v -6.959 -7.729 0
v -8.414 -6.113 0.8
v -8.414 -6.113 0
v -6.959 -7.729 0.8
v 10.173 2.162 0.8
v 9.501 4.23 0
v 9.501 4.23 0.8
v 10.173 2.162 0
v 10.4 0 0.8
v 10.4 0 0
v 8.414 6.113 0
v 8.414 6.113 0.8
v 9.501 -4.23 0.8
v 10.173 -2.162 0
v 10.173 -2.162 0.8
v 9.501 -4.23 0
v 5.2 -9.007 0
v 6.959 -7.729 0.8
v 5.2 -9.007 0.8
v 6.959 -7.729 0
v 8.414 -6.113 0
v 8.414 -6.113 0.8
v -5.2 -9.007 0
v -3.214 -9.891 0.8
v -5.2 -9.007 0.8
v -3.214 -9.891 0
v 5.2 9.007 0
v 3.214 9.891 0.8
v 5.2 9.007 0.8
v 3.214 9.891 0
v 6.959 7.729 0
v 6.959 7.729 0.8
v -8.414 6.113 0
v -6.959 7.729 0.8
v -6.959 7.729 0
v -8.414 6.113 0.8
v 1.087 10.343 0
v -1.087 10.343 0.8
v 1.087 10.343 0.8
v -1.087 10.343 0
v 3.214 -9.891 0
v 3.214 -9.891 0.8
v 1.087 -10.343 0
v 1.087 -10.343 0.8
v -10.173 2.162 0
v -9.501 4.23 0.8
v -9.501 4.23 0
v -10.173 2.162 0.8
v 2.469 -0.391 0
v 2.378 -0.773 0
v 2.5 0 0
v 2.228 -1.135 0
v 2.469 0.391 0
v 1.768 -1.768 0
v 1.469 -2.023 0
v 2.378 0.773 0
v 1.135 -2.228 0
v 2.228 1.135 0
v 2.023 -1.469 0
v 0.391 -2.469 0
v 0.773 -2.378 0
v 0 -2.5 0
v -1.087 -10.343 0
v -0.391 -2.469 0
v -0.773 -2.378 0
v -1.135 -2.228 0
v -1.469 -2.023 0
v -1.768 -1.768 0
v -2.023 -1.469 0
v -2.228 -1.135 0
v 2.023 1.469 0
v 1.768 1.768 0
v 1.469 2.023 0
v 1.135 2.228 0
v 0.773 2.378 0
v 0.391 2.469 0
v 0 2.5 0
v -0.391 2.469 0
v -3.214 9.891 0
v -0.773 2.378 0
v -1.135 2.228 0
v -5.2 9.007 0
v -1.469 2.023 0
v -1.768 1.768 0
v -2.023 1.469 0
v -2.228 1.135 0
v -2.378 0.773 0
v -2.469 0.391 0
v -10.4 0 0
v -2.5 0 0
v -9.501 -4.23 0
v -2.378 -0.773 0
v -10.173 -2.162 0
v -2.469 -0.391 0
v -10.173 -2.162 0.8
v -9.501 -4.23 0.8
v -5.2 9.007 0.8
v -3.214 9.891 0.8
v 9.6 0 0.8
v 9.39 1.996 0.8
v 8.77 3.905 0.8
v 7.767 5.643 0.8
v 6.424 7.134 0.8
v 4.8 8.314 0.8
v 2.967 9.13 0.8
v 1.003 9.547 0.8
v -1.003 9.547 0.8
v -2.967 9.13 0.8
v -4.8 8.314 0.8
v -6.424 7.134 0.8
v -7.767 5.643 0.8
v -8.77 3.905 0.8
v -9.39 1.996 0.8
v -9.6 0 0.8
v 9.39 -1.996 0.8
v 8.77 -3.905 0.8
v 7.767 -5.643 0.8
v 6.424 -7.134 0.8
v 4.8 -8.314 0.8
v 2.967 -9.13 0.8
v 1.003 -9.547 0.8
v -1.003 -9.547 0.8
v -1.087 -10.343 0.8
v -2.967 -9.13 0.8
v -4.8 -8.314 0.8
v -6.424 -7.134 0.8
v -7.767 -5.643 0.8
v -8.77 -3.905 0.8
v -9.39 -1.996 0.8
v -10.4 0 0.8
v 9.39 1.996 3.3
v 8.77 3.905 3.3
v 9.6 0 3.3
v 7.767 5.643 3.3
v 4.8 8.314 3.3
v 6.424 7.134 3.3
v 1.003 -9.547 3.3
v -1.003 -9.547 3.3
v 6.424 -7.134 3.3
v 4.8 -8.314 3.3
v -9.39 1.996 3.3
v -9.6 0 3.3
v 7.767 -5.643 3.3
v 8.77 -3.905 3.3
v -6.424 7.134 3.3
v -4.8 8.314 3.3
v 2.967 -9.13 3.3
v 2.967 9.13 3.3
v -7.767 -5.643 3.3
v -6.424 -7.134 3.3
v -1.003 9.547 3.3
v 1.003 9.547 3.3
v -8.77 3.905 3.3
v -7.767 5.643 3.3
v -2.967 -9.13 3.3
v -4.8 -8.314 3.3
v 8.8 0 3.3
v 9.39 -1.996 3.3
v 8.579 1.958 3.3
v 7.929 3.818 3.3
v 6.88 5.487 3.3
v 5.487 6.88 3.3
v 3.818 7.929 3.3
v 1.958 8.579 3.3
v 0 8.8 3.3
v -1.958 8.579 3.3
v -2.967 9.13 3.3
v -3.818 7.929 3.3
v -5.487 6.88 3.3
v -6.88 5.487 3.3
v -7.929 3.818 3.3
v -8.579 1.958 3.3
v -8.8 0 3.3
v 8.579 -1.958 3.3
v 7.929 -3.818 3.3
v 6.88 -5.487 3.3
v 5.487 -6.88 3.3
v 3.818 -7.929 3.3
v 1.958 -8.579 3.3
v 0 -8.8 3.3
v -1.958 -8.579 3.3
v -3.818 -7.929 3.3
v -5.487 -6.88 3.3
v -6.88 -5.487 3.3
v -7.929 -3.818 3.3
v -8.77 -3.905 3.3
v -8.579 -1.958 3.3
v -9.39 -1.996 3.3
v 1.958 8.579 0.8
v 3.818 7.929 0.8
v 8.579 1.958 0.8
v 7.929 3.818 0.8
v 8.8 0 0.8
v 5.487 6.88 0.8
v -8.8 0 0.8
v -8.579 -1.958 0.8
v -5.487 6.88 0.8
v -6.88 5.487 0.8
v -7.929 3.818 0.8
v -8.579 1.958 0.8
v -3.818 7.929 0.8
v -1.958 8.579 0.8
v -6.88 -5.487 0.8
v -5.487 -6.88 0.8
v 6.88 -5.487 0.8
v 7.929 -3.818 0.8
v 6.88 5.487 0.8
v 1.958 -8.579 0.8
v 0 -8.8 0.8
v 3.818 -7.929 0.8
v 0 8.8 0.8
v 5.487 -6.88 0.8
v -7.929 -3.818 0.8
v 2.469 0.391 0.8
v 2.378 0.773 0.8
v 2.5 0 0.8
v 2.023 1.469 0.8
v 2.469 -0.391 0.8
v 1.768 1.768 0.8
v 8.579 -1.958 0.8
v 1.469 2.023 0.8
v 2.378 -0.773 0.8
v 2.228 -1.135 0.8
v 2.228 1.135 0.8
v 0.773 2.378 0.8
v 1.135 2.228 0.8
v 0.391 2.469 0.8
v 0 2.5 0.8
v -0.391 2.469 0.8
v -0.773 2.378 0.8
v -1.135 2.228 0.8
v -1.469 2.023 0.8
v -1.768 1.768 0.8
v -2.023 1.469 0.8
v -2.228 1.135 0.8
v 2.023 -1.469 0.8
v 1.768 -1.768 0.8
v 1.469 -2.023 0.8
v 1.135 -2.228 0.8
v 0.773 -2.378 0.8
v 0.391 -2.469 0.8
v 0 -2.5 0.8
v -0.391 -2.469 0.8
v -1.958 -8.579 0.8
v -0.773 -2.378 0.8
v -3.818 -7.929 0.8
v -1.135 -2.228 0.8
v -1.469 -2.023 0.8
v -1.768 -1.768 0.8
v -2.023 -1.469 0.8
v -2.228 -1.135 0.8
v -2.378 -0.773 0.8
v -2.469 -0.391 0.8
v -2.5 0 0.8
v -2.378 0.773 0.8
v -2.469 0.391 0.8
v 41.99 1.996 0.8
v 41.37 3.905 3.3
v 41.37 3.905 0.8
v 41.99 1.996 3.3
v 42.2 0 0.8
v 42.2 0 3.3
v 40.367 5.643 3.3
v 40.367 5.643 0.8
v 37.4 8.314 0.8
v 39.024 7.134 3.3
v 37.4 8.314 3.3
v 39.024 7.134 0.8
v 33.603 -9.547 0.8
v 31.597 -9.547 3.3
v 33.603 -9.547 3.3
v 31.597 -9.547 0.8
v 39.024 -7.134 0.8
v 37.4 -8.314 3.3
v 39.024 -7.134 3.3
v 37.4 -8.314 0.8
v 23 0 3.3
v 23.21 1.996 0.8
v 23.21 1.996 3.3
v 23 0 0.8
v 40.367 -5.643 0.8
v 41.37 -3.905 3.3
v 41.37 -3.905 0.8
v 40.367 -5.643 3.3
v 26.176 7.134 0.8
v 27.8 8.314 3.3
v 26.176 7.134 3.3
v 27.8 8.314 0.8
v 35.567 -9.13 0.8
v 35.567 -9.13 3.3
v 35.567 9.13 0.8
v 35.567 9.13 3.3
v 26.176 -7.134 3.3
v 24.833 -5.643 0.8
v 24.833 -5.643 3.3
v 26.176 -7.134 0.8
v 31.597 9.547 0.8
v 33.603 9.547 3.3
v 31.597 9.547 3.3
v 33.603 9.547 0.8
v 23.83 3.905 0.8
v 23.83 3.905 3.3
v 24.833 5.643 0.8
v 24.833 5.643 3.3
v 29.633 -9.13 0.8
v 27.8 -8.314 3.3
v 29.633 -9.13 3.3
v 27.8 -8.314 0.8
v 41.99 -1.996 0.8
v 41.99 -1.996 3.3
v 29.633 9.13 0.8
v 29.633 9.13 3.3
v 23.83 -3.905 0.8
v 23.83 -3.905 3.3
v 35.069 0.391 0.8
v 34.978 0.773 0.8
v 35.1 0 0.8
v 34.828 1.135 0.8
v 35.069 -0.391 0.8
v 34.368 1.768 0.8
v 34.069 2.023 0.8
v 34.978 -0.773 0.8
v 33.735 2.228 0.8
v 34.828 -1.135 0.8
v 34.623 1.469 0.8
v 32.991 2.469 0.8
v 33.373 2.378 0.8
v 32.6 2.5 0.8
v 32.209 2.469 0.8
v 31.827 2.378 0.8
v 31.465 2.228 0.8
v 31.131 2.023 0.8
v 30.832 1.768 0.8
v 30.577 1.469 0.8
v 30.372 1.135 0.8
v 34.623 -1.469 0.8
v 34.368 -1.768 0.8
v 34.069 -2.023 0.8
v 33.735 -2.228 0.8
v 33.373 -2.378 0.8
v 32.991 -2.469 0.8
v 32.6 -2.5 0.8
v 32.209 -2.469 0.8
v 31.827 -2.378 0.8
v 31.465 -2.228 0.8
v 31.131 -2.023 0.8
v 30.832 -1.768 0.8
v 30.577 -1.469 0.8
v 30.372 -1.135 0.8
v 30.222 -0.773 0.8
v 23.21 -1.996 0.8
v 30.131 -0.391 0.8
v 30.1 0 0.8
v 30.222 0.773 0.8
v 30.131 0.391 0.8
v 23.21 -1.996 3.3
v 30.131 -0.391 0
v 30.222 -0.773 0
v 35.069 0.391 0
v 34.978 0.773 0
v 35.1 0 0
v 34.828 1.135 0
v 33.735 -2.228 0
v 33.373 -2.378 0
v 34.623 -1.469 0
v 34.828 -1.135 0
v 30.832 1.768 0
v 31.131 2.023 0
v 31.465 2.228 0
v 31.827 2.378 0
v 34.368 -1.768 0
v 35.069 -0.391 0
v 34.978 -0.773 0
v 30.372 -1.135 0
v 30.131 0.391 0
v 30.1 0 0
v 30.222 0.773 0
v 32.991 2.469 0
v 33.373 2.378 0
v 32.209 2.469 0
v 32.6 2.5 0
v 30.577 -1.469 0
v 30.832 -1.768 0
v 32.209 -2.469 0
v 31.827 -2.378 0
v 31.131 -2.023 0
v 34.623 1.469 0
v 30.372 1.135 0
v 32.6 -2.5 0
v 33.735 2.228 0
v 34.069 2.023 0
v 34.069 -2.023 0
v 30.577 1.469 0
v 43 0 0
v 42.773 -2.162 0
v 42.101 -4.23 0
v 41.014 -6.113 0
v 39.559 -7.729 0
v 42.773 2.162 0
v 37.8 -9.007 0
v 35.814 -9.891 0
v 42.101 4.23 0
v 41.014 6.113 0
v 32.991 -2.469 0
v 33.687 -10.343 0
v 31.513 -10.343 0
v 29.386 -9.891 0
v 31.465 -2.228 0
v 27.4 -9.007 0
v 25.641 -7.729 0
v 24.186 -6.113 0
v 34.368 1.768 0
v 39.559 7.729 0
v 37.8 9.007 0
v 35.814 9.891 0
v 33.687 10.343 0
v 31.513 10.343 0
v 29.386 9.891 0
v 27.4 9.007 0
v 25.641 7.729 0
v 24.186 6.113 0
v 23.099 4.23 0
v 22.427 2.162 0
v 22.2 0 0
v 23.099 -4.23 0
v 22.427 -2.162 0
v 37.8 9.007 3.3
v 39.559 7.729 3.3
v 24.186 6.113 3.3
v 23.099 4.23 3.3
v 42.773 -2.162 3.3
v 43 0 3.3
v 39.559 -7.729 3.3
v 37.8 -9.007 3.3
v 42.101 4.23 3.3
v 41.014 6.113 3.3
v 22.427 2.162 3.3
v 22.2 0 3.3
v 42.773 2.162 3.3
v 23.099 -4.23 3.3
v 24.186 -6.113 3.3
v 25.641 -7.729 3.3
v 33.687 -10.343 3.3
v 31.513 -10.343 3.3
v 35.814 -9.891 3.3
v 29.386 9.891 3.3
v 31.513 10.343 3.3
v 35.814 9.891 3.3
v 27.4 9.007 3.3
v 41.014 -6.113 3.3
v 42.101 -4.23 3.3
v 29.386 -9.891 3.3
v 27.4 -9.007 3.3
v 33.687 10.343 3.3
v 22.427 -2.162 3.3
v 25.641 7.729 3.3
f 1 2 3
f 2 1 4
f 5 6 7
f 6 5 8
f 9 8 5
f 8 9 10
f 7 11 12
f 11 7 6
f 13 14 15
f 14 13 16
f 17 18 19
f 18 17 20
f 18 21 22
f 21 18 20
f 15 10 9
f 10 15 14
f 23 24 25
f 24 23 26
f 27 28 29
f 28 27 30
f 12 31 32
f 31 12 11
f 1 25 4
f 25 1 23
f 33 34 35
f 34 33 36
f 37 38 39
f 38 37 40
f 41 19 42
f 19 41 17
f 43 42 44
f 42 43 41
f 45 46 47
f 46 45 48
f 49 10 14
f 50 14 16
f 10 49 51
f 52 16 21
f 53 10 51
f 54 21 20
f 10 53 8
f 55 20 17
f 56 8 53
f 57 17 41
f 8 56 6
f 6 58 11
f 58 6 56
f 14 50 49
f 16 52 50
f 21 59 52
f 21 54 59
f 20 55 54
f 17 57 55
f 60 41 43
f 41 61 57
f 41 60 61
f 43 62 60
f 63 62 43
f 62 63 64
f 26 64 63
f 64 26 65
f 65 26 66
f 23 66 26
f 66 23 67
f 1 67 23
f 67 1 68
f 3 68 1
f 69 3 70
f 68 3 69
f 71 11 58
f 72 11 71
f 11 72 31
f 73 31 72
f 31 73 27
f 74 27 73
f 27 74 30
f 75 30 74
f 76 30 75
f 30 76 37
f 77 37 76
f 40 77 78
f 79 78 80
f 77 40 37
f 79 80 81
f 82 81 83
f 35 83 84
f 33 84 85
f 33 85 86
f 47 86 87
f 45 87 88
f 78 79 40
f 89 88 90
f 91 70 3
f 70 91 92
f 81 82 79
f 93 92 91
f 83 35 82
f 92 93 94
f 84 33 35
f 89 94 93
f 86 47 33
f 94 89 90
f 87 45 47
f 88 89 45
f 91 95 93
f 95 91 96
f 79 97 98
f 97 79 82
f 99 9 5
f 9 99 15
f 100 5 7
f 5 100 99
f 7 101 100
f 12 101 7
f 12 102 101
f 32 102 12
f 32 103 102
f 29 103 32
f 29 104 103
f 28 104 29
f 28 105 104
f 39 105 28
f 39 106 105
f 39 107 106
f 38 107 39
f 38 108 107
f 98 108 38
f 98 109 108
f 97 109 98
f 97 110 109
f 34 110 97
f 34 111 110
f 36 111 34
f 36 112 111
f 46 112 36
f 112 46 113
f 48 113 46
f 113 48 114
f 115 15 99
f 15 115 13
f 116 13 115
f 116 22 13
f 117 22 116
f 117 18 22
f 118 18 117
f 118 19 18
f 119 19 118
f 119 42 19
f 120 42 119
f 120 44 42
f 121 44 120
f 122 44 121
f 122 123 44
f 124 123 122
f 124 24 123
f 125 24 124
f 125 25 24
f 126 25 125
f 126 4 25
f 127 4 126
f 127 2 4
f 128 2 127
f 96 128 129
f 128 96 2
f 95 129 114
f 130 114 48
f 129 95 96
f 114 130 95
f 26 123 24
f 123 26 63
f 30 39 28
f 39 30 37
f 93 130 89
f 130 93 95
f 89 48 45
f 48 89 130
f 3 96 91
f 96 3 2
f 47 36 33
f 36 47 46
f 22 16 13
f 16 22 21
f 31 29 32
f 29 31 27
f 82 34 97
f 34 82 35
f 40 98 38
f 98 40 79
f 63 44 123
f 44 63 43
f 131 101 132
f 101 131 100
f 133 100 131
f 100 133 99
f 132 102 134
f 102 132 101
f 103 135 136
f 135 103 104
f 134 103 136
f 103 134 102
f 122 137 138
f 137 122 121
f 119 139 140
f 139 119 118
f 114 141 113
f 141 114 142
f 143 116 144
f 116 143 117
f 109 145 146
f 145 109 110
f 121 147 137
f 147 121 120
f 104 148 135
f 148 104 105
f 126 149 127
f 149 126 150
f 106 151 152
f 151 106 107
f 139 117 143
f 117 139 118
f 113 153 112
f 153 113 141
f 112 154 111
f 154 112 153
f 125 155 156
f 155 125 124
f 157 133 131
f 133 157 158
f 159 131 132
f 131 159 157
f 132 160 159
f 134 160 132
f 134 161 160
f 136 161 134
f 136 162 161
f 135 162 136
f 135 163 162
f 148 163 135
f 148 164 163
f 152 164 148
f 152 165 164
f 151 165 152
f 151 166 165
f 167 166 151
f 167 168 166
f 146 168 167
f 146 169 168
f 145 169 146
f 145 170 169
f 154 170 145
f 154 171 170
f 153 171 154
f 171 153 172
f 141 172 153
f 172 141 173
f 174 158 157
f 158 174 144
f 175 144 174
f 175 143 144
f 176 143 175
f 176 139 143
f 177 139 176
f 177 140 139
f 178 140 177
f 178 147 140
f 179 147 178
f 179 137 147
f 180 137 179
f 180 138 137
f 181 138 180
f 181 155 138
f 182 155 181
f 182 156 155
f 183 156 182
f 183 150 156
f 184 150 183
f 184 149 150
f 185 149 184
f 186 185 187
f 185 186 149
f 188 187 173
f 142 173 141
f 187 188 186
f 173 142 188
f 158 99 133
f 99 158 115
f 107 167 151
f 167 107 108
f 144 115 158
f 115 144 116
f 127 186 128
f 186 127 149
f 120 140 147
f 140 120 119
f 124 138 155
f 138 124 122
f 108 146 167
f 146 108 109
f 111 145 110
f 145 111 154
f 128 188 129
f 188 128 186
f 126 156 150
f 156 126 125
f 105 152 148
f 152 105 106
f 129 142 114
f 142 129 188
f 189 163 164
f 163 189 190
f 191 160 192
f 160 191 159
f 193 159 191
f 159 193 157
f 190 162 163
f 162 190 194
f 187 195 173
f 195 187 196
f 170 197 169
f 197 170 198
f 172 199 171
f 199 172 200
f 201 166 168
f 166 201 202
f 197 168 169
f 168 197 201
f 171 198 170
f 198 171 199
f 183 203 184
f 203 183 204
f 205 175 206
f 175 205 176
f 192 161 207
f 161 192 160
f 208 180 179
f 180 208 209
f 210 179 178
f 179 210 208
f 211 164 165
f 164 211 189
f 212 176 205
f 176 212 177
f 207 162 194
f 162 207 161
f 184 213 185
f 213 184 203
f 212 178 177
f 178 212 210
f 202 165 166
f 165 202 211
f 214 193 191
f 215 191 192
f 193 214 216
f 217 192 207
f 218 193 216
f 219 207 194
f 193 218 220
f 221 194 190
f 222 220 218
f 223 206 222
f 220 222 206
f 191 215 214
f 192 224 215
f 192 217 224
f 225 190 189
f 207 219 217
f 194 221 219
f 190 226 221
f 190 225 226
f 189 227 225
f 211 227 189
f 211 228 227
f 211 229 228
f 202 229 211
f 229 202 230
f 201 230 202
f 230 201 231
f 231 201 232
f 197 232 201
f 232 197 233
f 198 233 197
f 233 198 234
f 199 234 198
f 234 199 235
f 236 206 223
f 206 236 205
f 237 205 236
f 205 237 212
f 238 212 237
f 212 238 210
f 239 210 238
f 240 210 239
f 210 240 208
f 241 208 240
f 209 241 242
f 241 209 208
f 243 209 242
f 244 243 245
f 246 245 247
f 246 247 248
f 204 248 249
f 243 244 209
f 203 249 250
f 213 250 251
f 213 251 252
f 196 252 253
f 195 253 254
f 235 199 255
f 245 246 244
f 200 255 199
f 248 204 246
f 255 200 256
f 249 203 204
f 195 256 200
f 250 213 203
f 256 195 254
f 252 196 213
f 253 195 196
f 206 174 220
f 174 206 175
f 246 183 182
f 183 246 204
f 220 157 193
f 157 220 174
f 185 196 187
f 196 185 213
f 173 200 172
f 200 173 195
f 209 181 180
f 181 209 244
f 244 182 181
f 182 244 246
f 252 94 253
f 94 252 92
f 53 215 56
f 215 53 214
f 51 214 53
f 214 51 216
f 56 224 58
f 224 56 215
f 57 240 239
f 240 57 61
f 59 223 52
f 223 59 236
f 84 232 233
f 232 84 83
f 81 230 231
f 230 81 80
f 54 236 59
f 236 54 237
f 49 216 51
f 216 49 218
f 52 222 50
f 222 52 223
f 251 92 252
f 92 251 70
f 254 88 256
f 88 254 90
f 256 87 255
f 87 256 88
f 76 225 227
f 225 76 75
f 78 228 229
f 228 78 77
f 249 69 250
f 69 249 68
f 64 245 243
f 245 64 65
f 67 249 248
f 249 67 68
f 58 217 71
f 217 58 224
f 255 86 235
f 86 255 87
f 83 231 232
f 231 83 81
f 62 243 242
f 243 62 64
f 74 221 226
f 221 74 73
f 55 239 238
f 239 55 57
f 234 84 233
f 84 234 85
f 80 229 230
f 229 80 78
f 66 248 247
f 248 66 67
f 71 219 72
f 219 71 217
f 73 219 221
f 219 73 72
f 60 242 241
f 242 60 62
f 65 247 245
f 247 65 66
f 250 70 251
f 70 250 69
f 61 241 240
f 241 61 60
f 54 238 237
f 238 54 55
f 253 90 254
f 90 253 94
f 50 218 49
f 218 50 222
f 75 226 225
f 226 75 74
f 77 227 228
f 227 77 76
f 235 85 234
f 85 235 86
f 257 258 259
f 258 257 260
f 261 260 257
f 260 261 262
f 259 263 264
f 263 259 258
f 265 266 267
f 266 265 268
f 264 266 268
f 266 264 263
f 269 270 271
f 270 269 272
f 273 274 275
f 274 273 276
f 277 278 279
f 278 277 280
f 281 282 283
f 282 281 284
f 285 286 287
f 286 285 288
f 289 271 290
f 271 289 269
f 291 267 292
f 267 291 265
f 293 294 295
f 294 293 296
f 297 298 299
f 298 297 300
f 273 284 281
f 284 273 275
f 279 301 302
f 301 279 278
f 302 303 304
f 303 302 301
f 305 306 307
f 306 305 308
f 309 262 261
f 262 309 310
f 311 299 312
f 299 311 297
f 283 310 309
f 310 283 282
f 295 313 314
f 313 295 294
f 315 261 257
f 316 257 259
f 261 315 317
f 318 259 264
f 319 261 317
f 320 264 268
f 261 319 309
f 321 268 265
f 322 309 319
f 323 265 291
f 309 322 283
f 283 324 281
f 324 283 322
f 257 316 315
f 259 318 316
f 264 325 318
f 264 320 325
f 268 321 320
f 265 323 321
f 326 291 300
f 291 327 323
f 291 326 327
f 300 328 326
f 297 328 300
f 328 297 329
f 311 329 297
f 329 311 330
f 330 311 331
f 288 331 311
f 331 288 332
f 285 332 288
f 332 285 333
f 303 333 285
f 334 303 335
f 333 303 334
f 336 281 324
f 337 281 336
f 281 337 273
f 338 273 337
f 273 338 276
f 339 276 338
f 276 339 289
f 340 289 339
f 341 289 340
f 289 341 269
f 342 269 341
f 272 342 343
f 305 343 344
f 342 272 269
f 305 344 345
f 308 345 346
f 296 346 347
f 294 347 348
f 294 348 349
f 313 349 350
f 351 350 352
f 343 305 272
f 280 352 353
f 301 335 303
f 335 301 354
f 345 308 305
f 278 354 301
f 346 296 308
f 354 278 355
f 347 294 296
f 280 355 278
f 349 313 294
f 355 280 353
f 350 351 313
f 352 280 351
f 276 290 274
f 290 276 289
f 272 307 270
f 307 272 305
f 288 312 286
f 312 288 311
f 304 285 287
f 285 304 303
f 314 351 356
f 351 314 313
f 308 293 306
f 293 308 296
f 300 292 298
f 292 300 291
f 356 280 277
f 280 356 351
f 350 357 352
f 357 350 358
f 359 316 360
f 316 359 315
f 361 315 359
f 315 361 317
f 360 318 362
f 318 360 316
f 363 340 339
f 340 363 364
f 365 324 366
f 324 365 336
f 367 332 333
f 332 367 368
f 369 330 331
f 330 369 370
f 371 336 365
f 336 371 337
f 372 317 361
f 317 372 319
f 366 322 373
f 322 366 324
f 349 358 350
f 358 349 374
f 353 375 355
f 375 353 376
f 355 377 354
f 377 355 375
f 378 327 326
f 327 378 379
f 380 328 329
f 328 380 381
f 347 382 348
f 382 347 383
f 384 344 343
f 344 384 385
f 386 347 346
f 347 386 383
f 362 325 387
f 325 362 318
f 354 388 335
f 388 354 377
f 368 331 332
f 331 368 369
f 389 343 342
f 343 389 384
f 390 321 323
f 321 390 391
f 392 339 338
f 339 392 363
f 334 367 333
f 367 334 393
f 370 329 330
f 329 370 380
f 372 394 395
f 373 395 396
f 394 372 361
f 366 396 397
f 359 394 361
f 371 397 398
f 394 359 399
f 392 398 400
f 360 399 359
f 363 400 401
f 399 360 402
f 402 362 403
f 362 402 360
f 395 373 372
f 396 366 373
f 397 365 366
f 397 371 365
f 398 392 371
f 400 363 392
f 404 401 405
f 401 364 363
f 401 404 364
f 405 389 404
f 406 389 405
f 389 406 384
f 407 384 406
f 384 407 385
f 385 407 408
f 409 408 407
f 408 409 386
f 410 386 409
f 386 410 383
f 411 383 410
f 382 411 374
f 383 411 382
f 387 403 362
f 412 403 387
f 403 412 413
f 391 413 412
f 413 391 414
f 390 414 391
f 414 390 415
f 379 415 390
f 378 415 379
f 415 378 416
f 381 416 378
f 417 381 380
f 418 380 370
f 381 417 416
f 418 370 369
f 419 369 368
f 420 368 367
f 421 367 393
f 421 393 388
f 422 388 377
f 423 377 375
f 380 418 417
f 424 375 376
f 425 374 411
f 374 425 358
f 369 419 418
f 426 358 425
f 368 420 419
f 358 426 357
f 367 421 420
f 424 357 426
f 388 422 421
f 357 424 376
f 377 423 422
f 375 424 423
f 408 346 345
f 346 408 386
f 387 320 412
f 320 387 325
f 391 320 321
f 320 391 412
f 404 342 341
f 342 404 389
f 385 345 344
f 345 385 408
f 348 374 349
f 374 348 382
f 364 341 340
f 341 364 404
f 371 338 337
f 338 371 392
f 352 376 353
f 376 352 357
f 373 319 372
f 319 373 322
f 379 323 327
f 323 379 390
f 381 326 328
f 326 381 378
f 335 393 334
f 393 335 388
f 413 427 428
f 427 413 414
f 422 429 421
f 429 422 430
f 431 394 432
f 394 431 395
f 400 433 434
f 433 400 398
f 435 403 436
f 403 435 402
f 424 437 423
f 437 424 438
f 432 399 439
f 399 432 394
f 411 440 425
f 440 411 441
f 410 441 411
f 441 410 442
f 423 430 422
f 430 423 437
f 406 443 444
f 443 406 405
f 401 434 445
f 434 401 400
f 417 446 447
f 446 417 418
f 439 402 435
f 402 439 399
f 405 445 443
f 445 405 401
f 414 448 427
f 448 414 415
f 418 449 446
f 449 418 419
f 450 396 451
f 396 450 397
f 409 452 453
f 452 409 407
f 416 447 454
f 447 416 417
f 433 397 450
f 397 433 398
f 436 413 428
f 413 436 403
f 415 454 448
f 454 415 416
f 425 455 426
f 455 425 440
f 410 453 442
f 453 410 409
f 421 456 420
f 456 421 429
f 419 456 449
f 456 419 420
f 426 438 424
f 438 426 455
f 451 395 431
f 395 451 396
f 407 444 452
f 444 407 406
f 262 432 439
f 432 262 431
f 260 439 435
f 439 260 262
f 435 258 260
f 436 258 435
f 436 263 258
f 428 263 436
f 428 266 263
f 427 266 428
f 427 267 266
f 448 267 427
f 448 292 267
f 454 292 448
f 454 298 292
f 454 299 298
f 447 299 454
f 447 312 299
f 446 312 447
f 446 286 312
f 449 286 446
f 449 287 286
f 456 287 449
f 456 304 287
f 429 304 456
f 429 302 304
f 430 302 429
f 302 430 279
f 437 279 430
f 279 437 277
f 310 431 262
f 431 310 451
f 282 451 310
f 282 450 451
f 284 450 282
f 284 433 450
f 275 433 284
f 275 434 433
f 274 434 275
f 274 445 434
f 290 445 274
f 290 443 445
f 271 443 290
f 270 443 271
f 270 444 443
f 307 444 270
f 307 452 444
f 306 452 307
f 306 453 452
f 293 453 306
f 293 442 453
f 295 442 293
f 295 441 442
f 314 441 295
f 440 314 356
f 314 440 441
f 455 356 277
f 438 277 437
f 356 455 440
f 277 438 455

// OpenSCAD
/* [General] */

Generate_top = true;
Generate_bottom = true;
Bottom_window = true;

/* [Extrusion] */

// Width of the nozzle
Extrusion_width = 0.4; // [0.1:0.1:1.0]
// Extrusion lines per wall
Extrusion_lines = 2;  // [1:1:10]

/* [Token parameters] */

// Height of the token in mm
Token_height = 2.5;

// Token diameter
Token_diameter = 17.6;

// Horizontal distance from the edge to window
Capsule_window_frame_diameter = 5;

//------------------------ DERIVED CONSTANTS ------------------------
wall_width = Extrusion_width * Extrusion_lines;
lower_lip_height = Extrusion_width * Extrusion_lines;

capsule_height = Token_height + lower_lip_height;
window_diameter = Capsule_window_frame_diameter;

//------------------------ MODULES ------------------------

module base_capsule() {
    difference() {
        union() {
            // lip base
            translate([0, 0, 0]) {
                cylinder(d = Token_diameter + wall_width * 4, lower_lip_height);
            }
            // token container
            translate([0, 0, lower_lip_height]) {
                cylinder(d = Token_diameter + wall_width * 2, Token_height);
            }
        }

        if (Bottom_window) {
            union() {
                translate([0, 0, lower_lip_height]) {
                    cylinder(d = Token_diameter, Token_height+1);
                }
                cylinder(d = window_diameter, lower_lip_height, $fn=40);
            }
        } else {
            translate([0, 0, lower_lip_height]) {
                cylinder(d = Token_diameter, Token_height+1);
            }
        }
    }
}

module top_capsule() {
    translate([Token_diameter + 15, 0, 0]) {
        difference() {
            union() {
                cylinder(d = Token_diameter + wall_width * 4, Token_height + lower_lip_height);
            }
            union() {
                translate([0, 0, lower_lip_height]) {
                    cylinder(d = Token_diameter + wall_width * 2, Token_height+1);
                }
                cylinder(d = window_diameter, lower_lip_height, $fn=40);
            }
        }
    }
}

//------------------------ MAIN EXECUTION ------------------------
if (Generate_bottom) {
    base_capsule();
}
if (Generate_top) {
    top_capsule();
}
